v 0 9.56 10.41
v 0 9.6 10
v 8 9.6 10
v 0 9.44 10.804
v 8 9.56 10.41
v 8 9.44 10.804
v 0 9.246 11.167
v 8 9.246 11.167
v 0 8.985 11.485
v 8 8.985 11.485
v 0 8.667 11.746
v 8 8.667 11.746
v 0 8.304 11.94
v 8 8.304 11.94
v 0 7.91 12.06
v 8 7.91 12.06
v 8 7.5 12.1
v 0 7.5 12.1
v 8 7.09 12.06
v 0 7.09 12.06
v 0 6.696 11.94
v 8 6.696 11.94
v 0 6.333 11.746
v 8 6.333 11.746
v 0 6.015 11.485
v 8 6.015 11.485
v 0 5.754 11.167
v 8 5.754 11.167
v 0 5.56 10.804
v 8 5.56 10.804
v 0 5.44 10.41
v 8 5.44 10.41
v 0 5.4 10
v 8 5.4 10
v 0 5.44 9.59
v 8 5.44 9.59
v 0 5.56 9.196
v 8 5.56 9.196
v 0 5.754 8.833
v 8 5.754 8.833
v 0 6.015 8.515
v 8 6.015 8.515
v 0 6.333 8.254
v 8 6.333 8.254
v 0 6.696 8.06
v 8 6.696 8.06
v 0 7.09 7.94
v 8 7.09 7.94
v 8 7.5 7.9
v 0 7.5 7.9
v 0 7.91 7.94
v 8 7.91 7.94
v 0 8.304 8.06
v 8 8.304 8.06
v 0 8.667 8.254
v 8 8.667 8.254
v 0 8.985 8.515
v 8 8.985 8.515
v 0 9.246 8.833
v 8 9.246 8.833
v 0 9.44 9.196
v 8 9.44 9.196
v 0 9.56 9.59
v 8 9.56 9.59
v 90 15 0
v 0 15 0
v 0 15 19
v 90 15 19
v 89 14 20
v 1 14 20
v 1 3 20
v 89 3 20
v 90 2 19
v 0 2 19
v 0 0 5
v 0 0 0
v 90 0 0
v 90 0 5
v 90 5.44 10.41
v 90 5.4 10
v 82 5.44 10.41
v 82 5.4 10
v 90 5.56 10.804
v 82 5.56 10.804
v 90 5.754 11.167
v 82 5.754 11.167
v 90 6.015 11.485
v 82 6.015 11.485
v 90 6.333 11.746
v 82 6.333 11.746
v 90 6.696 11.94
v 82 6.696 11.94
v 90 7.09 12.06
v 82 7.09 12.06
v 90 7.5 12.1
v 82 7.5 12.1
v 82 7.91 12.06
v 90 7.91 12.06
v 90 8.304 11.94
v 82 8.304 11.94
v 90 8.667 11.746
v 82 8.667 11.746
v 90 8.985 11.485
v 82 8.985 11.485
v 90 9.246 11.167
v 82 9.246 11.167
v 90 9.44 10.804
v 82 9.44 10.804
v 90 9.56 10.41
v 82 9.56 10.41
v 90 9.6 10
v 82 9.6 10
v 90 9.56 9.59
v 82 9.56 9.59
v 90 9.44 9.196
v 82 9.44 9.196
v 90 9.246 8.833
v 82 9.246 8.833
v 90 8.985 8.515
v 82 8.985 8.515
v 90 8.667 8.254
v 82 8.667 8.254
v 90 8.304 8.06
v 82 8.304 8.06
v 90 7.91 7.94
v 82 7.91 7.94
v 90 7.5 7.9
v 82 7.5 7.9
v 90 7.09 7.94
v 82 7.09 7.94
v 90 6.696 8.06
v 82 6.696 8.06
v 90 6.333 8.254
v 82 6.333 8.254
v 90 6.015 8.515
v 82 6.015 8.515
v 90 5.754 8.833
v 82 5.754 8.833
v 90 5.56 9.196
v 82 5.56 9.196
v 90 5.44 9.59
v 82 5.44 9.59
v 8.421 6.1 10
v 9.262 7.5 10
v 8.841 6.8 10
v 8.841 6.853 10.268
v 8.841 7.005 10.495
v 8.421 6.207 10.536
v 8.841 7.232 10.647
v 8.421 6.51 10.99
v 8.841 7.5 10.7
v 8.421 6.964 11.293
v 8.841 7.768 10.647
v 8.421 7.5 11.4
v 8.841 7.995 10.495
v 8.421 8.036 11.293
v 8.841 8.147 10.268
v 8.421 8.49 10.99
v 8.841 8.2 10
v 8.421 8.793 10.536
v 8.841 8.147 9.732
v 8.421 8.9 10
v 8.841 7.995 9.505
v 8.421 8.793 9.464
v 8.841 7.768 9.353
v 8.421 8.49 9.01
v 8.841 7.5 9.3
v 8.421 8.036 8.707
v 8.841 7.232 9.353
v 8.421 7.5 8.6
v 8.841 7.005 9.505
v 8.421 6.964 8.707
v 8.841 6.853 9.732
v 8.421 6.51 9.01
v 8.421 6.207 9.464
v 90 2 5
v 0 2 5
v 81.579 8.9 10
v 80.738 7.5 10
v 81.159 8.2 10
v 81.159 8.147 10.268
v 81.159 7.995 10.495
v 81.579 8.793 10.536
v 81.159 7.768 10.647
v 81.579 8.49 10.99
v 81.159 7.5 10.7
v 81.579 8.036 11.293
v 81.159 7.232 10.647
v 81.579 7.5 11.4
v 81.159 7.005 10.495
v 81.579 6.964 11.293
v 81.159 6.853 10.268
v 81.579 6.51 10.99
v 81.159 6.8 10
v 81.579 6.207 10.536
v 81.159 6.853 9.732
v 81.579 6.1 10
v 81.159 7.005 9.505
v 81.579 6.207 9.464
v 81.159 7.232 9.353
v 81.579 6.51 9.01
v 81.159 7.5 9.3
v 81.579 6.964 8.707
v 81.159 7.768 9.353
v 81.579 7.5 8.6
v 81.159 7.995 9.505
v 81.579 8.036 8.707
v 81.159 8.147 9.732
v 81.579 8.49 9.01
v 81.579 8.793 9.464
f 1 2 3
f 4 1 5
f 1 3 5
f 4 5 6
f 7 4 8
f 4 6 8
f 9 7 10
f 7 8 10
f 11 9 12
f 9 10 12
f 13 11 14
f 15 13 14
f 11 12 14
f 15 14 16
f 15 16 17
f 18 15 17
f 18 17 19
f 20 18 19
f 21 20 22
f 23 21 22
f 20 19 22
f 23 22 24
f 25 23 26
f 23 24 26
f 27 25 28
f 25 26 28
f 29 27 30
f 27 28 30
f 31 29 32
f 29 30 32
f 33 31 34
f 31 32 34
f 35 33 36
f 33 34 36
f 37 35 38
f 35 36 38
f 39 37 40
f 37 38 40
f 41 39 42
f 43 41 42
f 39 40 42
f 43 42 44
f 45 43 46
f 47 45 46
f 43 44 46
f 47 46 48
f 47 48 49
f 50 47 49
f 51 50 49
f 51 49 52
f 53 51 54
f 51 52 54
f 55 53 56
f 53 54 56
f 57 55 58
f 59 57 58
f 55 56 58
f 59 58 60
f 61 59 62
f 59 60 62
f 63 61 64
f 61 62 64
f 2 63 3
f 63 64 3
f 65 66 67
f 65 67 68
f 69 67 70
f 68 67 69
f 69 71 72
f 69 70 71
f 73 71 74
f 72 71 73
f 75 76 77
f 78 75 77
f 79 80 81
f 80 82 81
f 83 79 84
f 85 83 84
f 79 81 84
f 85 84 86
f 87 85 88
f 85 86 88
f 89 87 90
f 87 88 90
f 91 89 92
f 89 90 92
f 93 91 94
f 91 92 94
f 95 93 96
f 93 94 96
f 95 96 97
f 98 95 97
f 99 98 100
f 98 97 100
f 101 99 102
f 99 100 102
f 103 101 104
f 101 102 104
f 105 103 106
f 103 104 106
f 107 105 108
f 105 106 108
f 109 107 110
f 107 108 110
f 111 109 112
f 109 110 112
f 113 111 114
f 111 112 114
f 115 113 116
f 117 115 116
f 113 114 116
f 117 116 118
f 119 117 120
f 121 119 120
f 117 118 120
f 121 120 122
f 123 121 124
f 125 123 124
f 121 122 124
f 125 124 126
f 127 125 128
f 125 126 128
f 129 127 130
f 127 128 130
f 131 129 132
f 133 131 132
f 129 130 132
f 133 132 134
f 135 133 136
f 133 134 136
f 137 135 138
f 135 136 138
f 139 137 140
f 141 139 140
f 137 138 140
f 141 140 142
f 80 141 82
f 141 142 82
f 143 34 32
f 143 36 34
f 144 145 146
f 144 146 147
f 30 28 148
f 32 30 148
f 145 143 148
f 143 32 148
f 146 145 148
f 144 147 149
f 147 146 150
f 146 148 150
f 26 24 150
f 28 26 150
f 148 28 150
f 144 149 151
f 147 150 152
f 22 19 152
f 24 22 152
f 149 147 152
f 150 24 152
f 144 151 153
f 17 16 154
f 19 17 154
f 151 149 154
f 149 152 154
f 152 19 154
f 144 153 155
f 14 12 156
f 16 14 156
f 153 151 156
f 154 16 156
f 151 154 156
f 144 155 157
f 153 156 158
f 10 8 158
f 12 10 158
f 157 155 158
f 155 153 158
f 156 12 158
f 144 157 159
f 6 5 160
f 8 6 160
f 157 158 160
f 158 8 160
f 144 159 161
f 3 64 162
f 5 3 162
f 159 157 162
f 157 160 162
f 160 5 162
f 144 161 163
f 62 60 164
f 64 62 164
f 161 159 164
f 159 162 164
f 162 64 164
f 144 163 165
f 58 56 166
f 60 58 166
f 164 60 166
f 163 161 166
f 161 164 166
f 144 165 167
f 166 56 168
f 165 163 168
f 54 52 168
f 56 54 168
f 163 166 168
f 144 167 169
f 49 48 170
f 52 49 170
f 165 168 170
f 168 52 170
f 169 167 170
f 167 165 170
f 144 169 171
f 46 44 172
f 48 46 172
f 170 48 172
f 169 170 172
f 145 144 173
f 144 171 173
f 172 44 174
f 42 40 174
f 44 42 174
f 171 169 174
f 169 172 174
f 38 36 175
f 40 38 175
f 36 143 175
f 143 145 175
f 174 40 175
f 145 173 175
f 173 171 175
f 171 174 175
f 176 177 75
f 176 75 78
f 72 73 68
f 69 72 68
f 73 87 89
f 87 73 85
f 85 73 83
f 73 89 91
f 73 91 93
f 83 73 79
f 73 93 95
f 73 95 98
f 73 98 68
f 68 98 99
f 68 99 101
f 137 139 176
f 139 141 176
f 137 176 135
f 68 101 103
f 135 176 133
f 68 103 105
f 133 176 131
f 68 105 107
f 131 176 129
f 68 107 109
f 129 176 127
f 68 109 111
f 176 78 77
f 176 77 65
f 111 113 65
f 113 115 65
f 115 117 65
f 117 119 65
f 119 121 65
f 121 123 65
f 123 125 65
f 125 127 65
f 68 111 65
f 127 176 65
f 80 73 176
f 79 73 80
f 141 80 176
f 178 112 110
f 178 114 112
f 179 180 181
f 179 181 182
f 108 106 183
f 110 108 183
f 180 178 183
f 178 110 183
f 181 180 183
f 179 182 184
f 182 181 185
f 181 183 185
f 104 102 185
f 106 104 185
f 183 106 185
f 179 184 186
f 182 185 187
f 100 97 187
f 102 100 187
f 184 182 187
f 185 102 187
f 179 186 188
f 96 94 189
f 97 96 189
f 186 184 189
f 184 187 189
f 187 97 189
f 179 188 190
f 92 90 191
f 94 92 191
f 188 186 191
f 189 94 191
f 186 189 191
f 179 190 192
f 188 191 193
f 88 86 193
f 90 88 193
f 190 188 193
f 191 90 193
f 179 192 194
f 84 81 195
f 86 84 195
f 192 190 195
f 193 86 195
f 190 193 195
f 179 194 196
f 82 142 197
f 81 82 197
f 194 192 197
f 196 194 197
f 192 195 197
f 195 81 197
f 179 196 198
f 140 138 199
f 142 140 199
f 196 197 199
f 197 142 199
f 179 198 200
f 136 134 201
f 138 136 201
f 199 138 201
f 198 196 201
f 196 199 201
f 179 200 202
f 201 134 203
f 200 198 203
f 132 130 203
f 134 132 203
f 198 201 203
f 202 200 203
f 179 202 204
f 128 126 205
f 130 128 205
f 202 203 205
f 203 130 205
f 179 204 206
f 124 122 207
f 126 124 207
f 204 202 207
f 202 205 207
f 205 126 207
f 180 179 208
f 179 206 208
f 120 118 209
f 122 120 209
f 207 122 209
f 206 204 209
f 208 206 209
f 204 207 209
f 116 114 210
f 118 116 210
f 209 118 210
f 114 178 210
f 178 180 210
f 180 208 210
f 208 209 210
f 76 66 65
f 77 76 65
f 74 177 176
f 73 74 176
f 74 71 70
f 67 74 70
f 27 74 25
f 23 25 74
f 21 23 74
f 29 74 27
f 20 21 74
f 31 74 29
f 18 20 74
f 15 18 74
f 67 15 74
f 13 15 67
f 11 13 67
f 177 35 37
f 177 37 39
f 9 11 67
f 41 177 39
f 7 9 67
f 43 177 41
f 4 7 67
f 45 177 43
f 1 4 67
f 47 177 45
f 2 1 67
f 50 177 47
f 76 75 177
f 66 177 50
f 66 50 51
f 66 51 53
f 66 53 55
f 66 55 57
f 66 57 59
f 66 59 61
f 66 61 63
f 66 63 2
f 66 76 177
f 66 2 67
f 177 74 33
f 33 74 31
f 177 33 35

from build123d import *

# Parameters (mm, degrees)
F0_W     = 90
F0_H     = 15
F1_DEPTH = 5
F2_W     = 90
F2_H     = 13
F3_DEPTH = 15
F5_D     = 4.2
F5_DEPTH = 8
F5_TIP   = 1.2618073
F7_D     = 4.2
F7_DEPTH = 8
F7_TIP   = 1.2618073
F8_SIZE  = 1


with BuildPart() as f1:
    # F0 (on Top) → F1 (new body)
    with BuildSketch(Plane.XY):
        with Locations((45, 7.5)):
            Rectangle(F0_W, F0_H)
    extrude(amount=F1_DEPTH)

    # F2 (on face) → F3 (join)
    with BuildSketch(Plane.XY.offset(5)):
        with Locations((45, 8.5)):
            Rectangle(F2_W, F2_H)
    extrude(amount=F3_DEPTH)

    # F5
    with Locations(Plane.YZ.offset(90)):
        with Locations((7.5, 10)):
            Hole(F5_D / 2, depth=F5_DEPTH)
            with Locations((0, 0, -(F5_DEPTH + F5_TIP / 2))):  # 118° drill point
                Cone(0, F5_D / 2, F5_TIP, mode=Mode.SUBTRACT)

    # F7
    with Locations(Plane(origin=(0, 0, 0), x_dir=(0, -1, 0), z_dir=(-1, 0, 0))):
        with Locations((-7.5, 10)):
            Hole(F7_D / 2, depth=F7_DEPTH)
            with Locations((0, 0, -(F7_DEPTH + F7_TIP / 2))):  # 118° drill point
                Cone(0, F7_D / 2, F7_TIP, mode=Mode.SUBTRACT)

    # F8
    f8_edges = [f1.edges().sort_by_distance(p)[0] for p in [
        (45, 2, 20),
        (90, 8.5, 20),
        (45, 15, 20),
        (0, 8.5, 20),
    ]]
    chamfer(f8_edges, length=F8_SIZE)


solid = f1.part
